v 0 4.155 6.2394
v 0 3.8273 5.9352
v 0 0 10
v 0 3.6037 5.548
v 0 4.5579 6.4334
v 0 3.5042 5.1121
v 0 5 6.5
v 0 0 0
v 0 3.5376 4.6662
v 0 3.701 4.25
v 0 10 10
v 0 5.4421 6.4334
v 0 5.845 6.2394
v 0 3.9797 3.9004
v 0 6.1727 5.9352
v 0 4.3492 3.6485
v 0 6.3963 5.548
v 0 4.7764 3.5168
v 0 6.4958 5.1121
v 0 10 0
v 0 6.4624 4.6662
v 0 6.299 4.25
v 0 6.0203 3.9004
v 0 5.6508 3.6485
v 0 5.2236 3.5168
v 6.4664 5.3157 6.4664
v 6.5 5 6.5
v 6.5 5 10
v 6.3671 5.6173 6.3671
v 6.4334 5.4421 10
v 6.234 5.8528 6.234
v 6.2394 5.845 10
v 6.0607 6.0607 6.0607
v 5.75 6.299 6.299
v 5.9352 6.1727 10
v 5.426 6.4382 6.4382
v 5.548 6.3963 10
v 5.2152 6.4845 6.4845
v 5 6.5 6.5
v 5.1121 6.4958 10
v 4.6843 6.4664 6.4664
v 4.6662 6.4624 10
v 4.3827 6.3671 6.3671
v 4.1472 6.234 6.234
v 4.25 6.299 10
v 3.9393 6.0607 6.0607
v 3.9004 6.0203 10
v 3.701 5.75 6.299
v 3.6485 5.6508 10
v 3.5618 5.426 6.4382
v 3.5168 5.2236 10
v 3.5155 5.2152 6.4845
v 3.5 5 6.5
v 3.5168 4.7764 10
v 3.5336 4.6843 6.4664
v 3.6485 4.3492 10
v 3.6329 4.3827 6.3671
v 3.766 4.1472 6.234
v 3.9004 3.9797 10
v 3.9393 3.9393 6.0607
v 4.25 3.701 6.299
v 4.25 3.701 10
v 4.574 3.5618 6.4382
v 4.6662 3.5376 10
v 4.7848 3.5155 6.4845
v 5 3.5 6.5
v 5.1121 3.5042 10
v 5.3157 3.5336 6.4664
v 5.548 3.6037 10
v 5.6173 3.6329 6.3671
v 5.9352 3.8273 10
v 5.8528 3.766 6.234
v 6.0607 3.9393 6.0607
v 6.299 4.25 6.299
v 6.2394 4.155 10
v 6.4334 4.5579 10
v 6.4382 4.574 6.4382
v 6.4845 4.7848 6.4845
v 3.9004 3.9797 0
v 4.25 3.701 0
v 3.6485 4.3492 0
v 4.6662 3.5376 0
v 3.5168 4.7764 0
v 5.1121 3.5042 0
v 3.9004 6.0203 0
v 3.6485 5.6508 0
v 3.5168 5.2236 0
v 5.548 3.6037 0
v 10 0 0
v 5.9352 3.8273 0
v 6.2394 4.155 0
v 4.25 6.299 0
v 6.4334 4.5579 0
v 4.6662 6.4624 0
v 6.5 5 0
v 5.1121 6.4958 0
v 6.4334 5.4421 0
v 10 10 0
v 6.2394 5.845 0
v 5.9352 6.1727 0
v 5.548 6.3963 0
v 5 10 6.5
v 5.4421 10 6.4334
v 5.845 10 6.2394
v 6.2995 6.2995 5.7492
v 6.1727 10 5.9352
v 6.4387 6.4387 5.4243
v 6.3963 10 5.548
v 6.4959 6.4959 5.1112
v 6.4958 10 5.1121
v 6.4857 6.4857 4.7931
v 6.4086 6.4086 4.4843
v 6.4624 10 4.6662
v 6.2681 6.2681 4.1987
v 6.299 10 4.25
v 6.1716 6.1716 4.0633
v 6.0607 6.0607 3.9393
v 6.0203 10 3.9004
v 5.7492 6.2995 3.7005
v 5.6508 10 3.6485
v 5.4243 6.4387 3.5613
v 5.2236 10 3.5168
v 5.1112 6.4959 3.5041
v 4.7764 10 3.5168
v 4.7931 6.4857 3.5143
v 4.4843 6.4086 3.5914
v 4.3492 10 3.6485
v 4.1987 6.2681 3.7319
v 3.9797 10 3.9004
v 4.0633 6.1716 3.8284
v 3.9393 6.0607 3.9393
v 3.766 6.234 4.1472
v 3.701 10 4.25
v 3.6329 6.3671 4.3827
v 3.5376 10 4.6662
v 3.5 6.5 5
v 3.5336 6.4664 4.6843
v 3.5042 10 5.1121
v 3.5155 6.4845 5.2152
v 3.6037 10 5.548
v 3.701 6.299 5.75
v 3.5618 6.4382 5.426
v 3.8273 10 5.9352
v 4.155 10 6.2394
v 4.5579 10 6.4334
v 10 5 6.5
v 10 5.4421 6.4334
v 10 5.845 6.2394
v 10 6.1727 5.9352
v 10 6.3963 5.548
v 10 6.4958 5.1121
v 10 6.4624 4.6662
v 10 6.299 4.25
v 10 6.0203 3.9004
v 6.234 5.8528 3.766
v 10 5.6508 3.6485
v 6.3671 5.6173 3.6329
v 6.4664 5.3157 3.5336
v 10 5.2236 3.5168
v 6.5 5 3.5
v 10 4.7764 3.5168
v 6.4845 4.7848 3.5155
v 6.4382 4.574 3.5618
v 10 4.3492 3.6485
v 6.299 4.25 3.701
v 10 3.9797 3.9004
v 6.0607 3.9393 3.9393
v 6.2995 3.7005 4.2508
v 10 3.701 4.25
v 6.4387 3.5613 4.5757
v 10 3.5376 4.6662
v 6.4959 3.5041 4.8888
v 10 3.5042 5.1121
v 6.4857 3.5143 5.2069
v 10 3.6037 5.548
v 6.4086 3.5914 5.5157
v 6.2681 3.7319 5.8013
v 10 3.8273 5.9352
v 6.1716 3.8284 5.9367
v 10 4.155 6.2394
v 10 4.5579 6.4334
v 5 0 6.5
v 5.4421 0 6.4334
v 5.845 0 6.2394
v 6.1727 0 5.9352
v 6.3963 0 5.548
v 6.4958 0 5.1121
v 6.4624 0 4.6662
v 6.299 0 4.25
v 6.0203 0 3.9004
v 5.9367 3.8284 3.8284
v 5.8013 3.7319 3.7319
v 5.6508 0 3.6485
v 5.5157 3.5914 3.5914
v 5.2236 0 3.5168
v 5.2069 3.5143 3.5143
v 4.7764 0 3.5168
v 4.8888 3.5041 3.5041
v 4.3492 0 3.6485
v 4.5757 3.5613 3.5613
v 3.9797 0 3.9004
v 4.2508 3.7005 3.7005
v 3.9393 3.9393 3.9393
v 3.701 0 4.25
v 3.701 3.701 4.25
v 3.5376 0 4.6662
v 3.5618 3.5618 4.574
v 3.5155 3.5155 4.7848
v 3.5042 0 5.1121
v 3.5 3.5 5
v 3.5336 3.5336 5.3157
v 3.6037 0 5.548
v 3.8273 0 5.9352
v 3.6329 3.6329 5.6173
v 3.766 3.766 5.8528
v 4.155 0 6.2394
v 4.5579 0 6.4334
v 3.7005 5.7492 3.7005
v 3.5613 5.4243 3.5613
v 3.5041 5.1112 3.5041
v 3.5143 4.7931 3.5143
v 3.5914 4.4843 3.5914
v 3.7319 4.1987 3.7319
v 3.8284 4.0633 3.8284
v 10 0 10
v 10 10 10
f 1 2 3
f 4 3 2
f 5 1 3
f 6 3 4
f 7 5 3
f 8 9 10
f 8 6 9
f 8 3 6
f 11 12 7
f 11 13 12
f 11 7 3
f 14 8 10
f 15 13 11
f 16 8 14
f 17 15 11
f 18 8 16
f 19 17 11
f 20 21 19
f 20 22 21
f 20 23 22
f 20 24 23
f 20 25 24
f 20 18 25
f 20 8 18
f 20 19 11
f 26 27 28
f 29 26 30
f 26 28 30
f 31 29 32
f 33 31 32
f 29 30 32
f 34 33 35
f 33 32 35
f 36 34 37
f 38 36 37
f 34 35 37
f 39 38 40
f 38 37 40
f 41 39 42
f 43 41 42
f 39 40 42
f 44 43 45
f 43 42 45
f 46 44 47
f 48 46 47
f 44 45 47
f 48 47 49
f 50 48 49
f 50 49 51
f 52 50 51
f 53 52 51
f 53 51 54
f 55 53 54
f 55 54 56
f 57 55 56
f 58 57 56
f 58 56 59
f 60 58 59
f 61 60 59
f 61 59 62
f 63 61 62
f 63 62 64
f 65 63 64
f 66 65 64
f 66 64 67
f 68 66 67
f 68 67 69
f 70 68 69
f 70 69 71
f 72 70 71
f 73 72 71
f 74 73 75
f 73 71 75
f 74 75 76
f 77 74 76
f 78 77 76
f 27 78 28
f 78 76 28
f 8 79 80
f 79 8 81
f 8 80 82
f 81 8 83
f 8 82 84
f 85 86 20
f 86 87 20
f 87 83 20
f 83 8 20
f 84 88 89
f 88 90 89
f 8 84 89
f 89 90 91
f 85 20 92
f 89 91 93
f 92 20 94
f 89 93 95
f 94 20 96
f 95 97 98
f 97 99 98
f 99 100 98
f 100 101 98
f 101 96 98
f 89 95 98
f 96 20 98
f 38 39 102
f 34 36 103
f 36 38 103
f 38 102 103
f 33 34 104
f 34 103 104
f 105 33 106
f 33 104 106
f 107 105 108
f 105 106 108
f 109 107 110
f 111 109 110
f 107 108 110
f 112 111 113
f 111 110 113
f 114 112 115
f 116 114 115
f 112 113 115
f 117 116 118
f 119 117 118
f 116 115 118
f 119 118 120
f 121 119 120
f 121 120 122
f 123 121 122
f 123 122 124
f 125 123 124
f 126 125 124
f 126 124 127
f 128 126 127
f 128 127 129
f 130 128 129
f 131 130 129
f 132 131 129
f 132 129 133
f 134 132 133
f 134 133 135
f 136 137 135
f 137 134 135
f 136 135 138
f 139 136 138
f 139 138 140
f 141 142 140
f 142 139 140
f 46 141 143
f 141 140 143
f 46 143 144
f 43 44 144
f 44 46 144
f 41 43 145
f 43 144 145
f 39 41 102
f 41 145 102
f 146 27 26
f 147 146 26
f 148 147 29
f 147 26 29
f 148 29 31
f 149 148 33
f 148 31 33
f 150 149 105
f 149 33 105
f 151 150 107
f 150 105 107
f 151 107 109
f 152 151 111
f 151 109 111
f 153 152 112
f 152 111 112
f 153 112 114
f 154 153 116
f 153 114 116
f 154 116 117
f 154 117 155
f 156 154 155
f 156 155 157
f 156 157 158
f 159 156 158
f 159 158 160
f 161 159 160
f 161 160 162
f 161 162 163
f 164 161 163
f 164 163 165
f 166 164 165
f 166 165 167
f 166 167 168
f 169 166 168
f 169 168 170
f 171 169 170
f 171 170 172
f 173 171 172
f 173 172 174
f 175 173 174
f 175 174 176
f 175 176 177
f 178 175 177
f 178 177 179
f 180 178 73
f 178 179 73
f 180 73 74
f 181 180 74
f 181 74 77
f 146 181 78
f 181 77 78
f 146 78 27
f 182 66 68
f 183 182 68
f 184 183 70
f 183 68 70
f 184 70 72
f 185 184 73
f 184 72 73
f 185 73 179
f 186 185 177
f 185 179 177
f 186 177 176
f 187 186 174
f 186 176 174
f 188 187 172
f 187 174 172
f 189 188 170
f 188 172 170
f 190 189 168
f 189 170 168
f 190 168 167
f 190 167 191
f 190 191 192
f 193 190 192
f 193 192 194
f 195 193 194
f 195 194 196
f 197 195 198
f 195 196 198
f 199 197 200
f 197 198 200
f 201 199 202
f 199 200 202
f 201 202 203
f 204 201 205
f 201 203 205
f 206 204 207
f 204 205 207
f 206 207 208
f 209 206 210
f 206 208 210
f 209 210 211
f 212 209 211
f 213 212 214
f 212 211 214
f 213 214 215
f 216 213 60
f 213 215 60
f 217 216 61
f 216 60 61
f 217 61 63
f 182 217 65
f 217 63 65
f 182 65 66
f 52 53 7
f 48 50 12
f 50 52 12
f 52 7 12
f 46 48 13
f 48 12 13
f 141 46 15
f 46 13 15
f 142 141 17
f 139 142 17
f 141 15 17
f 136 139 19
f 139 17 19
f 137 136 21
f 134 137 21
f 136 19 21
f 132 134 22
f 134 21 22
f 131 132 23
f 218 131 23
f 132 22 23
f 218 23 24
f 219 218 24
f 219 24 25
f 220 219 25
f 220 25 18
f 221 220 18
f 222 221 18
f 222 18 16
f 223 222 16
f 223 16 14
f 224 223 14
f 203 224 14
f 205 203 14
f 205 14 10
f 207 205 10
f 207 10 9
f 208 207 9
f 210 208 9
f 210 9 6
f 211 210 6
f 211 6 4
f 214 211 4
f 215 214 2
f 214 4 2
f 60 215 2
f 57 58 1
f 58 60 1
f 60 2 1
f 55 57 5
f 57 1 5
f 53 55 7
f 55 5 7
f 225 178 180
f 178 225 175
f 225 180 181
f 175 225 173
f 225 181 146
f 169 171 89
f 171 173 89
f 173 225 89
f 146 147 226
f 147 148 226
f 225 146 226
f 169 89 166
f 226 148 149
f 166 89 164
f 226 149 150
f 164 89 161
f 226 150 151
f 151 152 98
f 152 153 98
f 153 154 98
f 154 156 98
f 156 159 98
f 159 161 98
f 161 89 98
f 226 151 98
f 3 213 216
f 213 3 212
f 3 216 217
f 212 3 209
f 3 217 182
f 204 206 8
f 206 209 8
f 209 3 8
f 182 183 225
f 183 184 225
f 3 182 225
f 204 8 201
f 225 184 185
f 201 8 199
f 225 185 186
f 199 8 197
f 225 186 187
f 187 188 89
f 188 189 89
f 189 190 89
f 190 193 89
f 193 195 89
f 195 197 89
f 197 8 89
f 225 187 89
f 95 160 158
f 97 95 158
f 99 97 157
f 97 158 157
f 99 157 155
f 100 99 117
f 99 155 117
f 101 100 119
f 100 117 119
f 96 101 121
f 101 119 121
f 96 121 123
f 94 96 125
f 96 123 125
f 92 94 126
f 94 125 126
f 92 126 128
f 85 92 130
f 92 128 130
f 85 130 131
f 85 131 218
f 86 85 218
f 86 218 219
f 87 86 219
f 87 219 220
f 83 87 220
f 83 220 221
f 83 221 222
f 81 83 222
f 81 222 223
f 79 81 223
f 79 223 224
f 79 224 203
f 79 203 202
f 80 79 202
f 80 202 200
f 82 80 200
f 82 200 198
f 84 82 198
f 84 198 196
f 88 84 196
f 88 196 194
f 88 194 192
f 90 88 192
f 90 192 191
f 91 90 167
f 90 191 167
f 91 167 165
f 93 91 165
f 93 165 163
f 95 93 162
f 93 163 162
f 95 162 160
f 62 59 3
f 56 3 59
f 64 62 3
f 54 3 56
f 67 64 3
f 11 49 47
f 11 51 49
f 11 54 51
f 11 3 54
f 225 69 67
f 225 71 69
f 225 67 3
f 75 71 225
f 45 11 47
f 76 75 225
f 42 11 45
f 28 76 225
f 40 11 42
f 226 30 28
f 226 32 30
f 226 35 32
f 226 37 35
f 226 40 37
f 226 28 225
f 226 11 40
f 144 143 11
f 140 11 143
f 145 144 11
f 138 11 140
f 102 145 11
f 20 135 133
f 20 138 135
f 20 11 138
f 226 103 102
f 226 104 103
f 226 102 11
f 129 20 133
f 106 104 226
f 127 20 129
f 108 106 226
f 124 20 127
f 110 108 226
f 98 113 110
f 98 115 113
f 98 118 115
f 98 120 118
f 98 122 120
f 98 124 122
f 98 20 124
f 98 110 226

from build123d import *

# Parameters (mm, degrees)
SKETCH_1_W          = 10
SKETCH_1_H          = 10
EXTRUDE_1_DEPTH     = 10
SKETCH_2_R          = 1.5
CUT_EXTRUDE_1_DEPTH = 18.320508076
SKETCH_3_R          = 1.5
CUT_EXTRUDE_2_DEPTH = 18.320508076
SKETCH_4_R          = 1.5
CUT_EXTRUDE_3_DEPTH = 18.320508076


with BuildPart() as part:
    # 草图1 → 凸台-拉伸1 (new body)
    with BuildSketch(Plane.XY):
        with Locations((5, 5)):
            Rectangle(SKETCH_1_W, SKETCH_1_H)
    extrude(amount=EXTRUDE_1_DEPTH)

    # 草图2 → 切除-拉伸1 (cut, through all)
    with BuildSketch(Plane.XY.offset(10)):
        with Locations((5, 5)):
            Circle(SKETCH_2_R)
    extrude(amount=-CUT_EXTRUDE_1_DEPTH, mode=Mode.SUBTRACT)

    # 草图3 → 切除-拉伸2 (cut, through all)
    with BuildSketch(Plane.ZY):
        with Locations((5, 5)):
            Circle(SKETCH_3_R)
    extrude(amount=-CUT_EXTRUDE_2_DEPTH, mode=Mode.SUBTRACT)

    # 草图4 → 切除-拉伸3 (cut, through all)
    with BuildSketch(Plane(origin=(0, 10, 0), x_dir=(1, 0, 0), z_dir=(0, 1, 0))):
        with Locations(Location((5, -5, 0), (0, 0, 270))):
            Circle(SKETCH_4_R)
    extrude(amount=-CUT_EXTRUDE_3_DEPTH, mode=Mode.SUBTRACT)


solid = part.part
